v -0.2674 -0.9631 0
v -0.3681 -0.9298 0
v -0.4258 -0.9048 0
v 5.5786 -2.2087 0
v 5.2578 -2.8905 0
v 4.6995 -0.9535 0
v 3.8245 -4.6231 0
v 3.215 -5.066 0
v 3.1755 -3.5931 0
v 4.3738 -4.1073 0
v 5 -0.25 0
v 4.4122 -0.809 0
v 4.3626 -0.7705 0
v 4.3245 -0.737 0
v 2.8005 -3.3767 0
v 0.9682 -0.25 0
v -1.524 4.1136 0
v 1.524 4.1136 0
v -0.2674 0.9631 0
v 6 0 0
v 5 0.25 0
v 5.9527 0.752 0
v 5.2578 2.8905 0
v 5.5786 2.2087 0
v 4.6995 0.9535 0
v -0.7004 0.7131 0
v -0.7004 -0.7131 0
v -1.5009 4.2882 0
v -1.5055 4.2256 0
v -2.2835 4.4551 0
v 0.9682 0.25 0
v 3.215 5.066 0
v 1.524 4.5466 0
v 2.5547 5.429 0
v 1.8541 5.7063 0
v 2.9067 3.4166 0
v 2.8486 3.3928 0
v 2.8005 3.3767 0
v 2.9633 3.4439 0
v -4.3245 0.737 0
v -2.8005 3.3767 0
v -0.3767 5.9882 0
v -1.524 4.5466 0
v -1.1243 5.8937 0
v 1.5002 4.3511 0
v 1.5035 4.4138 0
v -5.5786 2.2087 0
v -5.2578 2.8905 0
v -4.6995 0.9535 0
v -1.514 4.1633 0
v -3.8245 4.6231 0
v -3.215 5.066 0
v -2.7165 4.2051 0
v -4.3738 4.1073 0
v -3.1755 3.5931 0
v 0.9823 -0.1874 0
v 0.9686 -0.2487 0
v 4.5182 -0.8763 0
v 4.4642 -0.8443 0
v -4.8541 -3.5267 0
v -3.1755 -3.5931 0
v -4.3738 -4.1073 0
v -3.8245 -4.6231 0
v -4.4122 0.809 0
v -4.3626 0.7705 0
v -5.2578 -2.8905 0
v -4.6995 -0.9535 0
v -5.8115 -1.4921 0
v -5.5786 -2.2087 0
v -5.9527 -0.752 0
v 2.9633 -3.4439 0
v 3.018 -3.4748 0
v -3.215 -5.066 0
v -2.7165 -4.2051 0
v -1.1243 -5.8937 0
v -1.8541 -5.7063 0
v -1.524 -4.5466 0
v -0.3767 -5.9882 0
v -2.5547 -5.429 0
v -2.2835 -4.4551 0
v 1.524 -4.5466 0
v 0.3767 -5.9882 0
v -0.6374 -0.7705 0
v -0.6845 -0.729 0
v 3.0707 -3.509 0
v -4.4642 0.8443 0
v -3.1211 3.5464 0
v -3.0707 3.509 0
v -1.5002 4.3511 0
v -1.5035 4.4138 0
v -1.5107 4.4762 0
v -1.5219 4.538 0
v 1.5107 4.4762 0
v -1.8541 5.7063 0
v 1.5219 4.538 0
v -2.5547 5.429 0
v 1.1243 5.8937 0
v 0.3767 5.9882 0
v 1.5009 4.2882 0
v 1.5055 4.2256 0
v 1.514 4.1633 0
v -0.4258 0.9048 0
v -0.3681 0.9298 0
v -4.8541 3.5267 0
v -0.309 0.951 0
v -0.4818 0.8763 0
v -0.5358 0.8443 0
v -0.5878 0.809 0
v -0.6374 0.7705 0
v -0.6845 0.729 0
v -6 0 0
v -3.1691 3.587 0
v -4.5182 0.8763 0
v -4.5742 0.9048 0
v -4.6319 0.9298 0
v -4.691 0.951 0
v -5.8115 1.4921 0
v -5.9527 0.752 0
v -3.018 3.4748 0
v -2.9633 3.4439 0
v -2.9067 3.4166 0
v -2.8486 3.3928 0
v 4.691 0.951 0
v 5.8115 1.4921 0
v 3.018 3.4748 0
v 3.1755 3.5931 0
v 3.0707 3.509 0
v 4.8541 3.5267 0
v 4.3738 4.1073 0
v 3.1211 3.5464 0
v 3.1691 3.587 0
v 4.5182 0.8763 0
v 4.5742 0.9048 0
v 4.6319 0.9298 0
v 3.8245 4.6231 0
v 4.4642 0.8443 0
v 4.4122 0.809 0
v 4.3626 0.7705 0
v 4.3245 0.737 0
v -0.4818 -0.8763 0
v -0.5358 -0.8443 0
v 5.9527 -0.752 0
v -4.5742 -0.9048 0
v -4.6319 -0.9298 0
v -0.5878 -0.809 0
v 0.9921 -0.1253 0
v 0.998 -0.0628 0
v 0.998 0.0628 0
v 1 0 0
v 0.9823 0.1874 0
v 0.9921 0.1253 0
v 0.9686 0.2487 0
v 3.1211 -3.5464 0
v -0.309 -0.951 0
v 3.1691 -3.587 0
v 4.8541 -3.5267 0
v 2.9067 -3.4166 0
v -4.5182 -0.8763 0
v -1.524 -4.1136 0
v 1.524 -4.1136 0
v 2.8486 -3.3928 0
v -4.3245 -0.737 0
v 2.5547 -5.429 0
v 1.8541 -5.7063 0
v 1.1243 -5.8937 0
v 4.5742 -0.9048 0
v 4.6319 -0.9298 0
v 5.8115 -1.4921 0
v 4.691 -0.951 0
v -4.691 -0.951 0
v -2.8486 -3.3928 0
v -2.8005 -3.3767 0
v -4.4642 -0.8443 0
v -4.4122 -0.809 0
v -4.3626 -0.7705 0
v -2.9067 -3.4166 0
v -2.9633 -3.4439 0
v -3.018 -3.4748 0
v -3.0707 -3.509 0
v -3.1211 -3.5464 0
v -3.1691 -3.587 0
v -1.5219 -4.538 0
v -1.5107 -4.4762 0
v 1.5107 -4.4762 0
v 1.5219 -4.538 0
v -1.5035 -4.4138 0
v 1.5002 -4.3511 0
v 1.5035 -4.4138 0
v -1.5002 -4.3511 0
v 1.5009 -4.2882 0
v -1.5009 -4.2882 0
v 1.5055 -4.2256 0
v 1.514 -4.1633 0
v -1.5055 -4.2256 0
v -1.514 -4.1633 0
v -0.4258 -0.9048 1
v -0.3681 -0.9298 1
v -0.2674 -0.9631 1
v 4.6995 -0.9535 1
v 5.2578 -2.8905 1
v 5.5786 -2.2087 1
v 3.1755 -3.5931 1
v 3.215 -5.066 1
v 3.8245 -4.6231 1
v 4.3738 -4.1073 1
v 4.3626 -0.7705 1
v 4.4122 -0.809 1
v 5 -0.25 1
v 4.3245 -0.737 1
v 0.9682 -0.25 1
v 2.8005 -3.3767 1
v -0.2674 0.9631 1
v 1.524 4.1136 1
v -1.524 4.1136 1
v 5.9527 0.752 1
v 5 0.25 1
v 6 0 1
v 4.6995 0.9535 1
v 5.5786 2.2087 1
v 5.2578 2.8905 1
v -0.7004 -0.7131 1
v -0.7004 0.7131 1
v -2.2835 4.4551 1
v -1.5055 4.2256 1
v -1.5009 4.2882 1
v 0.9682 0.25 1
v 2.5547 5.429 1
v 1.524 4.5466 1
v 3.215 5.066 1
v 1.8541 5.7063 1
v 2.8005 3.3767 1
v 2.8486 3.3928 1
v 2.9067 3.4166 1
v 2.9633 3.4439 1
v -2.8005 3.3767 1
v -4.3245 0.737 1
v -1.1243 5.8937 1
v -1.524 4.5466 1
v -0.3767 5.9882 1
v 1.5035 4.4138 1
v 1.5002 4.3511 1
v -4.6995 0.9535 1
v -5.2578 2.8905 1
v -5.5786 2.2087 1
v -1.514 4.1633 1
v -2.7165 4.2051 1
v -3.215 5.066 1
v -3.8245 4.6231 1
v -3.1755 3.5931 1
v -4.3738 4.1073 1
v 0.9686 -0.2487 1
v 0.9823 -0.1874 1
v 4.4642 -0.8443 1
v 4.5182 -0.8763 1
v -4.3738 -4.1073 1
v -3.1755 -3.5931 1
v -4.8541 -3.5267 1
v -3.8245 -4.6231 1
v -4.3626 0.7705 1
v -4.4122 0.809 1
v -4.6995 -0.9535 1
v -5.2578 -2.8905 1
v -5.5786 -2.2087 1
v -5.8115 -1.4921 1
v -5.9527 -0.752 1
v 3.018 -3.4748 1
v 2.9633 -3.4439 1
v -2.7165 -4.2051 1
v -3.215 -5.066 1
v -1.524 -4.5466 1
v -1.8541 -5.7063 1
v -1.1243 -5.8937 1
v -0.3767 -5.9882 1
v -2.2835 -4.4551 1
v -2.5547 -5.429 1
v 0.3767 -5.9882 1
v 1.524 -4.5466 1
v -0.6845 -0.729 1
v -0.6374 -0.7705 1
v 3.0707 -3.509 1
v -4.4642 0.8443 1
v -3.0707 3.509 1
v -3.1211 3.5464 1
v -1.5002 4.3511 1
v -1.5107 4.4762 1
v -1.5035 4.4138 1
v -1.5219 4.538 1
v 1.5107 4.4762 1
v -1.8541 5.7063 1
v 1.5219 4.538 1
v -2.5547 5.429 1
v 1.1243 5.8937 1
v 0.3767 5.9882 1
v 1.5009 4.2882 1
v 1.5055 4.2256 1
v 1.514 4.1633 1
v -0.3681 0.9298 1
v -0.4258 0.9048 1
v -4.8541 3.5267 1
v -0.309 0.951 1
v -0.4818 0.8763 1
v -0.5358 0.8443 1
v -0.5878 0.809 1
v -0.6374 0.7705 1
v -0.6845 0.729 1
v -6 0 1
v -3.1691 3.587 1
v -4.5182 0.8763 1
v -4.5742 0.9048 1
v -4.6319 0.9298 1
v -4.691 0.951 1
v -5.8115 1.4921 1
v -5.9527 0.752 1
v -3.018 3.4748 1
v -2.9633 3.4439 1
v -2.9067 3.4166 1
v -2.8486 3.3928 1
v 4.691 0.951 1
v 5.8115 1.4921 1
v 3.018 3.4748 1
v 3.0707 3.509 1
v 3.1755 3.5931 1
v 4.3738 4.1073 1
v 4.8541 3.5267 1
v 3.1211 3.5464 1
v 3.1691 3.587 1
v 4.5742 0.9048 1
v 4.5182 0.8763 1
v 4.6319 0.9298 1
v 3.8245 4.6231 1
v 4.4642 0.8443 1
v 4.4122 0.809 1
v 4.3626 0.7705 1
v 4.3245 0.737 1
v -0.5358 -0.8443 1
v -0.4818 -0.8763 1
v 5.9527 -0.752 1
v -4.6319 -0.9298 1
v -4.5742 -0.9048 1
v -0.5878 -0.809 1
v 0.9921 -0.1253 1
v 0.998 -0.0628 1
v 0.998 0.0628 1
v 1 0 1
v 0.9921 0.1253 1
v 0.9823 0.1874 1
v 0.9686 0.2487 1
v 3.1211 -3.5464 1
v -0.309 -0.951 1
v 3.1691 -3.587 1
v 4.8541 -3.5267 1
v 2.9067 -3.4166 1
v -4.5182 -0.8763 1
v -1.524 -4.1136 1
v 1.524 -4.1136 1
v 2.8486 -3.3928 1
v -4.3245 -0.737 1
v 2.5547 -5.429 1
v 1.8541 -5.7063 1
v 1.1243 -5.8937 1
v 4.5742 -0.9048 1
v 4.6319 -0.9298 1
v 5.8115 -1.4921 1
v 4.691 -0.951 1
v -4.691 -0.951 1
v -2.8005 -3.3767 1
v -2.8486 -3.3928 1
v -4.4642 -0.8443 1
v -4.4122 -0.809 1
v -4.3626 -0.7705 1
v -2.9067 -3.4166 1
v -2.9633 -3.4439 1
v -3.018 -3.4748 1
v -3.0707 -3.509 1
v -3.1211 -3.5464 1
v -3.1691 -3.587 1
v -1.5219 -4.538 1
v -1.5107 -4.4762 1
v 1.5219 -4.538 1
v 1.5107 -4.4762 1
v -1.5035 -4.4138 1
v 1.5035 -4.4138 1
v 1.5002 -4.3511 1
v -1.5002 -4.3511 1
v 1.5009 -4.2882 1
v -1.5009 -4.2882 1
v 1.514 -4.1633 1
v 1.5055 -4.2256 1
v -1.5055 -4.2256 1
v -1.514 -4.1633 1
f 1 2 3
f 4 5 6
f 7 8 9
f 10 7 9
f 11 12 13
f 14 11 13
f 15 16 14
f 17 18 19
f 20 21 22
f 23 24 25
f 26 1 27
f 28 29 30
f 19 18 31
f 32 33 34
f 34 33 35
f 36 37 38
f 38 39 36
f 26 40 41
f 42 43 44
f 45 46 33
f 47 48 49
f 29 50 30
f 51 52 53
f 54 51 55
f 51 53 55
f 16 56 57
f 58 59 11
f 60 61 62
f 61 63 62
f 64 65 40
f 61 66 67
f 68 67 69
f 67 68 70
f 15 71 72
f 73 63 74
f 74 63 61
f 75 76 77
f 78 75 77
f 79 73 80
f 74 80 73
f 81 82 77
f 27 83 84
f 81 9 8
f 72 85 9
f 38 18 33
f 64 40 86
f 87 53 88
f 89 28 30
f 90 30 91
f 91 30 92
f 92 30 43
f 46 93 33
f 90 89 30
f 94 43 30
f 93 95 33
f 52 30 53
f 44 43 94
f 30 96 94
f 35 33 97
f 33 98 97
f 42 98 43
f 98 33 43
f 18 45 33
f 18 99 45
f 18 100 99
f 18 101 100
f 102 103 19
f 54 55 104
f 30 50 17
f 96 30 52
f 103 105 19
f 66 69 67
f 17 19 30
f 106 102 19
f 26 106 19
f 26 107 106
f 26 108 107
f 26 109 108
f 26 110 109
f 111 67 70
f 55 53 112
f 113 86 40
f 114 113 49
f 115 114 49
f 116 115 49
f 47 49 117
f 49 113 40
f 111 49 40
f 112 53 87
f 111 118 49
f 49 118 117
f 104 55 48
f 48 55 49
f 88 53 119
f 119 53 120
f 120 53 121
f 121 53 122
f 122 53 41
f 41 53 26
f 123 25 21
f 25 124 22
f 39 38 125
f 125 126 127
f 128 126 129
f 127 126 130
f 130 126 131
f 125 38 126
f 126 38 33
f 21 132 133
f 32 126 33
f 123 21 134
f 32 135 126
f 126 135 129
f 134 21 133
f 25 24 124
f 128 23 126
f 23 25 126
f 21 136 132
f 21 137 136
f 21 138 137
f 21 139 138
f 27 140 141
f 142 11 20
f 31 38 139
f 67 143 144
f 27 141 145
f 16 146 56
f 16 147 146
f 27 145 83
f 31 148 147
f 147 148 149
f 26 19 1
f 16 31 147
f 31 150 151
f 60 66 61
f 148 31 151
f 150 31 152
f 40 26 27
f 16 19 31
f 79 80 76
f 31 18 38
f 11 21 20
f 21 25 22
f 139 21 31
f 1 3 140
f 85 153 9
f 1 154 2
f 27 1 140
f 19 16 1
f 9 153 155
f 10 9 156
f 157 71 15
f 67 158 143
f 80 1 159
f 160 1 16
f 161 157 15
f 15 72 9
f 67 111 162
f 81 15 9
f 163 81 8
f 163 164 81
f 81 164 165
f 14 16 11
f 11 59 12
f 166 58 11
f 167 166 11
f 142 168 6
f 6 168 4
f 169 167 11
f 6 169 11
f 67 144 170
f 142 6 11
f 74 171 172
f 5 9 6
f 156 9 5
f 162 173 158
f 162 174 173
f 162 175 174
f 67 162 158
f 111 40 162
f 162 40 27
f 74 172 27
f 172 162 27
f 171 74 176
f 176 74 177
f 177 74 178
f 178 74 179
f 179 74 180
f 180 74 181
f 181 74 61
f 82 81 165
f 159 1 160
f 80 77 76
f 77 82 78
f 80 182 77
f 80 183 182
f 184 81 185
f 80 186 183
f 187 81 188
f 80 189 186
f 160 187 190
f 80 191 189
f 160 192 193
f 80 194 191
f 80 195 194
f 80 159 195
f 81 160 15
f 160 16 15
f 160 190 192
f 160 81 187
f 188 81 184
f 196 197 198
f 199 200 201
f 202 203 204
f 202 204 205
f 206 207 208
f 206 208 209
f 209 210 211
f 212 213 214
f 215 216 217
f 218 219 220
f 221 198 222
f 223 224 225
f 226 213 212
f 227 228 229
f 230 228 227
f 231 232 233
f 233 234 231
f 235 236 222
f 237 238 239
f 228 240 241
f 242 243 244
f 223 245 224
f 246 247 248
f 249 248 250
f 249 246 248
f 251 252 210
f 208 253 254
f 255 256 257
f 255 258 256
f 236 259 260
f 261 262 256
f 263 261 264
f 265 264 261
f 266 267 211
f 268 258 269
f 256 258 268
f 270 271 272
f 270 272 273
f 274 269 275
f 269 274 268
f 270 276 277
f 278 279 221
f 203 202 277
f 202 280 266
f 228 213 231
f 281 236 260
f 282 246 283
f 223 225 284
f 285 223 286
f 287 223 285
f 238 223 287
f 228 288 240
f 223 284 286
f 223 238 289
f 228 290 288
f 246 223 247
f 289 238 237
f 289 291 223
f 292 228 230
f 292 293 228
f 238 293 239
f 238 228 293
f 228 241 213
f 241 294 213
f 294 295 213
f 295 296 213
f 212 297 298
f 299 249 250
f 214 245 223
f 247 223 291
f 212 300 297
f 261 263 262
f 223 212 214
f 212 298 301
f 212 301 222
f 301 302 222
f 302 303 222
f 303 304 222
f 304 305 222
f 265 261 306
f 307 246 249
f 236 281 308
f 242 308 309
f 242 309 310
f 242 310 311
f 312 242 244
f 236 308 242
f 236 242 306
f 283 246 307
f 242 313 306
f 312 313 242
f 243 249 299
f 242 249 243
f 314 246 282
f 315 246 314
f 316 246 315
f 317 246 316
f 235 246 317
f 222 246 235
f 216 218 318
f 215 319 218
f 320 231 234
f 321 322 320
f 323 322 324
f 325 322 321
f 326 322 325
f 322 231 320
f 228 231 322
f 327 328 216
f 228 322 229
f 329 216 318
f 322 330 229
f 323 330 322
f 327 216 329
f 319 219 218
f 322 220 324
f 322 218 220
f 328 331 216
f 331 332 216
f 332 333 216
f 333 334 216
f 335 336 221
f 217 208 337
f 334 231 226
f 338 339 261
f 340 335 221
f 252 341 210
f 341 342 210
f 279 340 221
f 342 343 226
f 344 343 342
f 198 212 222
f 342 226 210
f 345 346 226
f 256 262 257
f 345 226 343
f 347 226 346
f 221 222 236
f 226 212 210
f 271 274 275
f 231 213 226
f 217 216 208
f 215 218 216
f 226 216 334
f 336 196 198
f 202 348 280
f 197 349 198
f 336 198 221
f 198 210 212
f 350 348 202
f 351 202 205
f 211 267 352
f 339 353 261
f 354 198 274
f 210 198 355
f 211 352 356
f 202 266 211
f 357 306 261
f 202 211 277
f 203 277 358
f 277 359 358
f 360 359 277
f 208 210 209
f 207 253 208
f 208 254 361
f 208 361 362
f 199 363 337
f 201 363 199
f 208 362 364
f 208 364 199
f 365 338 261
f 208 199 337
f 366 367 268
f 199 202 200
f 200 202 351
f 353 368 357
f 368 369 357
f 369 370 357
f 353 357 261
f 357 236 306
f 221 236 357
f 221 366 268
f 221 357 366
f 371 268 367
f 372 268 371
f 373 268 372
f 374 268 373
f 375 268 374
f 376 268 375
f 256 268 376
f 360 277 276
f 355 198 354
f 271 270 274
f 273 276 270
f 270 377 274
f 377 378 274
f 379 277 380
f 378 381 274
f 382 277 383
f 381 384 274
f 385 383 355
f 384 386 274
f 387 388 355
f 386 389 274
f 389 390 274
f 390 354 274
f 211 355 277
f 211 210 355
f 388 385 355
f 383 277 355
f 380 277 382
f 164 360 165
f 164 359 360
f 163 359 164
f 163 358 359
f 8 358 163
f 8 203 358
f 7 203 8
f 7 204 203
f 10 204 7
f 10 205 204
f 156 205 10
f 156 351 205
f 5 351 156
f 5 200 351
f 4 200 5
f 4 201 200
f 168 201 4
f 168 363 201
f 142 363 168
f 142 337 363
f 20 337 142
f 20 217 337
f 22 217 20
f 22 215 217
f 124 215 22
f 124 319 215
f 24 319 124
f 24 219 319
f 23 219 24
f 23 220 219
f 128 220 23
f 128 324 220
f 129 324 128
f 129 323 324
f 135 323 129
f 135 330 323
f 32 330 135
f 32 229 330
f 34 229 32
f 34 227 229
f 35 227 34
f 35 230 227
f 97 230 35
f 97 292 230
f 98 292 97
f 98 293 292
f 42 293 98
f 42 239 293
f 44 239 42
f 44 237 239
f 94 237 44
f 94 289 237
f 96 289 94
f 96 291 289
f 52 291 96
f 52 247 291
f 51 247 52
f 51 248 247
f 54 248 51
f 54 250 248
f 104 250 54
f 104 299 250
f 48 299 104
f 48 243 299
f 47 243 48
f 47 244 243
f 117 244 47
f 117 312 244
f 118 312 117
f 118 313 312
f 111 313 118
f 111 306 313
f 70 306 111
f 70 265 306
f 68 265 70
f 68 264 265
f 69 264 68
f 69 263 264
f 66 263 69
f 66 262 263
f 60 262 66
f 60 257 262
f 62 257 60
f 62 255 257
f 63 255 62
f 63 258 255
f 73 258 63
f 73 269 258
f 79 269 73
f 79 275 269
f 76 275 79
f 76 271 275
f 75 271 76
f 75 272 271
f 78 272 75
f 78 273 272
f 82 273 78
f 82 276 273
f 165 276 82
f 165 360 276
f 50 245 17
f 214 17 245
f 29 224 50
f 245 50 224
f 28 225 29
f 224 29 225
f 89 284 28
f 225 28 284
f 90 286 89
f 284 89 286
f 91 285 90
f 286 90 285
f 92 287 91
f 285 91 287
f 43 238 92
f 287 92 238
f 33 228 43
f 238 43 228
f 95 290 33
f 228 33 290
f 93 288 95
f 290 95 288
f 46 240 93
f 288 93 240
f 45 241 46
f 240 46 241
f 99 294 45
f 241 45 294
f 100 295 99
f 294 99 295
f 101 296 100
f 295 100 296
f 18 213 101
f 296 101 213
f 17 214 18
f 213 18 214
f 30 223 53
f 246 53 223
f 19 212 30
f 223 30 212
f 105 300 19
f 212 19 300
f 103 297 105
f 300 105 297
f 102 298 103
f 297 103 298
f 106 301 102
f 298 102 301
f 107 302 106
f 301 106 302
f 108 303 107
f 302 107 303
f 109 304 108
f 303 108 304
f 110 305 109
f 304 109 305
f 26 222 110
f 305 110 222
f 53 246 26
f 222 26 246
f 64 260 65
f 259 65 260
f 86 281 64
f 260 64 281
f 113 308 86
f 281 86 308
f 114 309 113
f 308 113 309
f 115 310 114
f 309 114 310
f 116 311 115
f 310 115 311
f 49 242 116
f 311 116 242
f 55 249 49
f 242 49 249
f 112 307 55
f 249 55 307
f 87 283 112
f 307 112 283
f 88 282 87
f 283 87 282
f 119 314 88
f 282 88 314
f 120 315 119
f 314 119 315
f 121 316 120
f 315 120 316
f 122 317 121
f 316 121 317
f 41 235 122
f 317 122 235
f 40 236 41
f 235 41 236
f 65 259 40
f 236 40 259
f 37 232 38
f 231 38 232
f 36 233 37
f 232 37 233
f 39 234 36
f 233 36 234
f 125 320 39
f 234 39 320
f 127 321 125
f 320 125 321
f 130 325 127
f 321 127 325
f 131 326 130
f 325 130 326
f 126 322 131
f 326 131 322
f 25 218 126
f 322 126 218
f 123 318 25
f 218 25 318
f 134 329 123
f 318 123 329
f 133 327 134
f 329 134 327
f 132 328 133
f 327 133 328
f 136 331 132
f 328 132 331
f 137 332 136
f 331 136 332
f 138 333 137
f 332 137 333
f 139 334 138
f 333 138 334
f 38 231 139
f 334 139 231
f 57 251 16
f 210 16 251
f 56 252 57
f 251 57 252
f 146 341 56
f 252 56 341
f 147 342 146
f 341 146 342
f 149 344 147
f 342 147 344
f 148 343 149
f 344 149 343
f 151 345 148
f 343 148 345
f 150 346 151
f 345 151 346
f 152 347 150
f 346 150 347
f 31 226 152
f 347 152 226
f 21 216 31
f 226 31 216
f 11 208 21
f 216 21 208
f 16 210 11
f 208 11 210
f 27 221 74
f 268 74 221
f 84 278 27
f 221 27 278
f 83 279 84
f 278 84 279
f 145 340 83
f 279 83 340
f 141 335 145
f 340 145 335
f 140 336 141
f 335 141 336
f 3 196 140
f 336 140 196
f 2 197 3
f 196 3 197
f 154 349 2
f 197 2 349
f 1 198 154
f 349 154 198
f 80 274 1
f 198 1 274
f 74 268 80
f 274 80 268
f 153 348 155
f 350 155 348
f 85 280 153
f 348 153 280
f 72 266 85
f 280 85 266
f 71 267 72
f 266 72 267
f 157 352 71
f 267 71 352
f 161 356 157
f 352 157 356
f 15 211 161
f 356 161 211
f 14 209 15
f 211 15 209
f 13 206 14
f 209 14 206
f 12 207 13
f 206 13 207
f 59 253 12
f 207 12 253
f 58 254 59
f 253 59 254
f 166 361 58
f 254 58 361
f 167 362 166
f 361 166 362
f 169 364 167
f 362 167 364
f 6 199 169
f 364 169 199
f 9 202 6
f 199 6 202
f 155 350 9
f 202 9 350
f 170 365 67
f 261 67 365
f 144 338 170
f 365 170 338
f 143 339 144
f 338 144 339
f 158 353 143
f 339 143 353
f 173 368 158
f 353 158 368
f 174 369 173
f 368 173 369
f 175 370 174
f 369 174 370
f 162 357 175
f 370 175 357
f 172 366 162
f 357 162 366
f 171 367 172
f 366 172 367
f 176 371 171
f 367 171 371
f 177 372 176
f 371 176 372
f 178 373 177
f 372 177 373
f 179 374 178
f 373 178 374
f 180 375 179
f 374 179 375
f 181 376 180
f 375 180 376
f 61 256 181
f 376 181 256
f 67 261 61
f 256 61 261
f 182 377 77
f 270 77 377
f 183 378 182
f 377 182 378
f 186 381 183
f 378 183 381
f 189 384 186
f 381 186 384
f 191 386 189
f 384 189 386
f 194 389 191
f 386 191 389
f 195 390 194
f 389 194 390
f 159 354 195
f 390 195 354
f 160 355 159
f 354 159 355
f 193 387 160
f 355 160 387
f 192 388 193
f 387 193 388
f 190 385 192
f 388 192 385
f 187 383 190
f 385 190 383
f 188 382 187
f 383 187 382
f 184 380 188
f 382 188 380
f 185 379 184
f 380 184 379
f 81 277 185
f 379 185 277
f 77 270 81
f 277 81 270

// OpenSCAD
line_length=5;
line_width=0.5;
letterspace=2;
module hexagon(){
	difference(){
		circle(r=line_length+line_width/2,$fn=6);
		union(){
			circle(r=line_length-line_width/2,$fn=6);
			for(i=[1:6]) rotate([0,0,i*360/6]) translate([line_length,0]) circle(r=2/2,$fn=100);
		}
	}
}
module trithing(){
	difference(){
		for(i=[1:3]) rotate([0,0,i*360/3])
		translate([0,line_width/-2]) square([line_length,line_width]);
		circle(r=letterspace/2,$fn=100);
	}
}
linear_extrude(height=1)
difference(){
	circle(r=line_length+1,$fn=50);
	union(){
		hexagon();
		trithing();
	}
}
